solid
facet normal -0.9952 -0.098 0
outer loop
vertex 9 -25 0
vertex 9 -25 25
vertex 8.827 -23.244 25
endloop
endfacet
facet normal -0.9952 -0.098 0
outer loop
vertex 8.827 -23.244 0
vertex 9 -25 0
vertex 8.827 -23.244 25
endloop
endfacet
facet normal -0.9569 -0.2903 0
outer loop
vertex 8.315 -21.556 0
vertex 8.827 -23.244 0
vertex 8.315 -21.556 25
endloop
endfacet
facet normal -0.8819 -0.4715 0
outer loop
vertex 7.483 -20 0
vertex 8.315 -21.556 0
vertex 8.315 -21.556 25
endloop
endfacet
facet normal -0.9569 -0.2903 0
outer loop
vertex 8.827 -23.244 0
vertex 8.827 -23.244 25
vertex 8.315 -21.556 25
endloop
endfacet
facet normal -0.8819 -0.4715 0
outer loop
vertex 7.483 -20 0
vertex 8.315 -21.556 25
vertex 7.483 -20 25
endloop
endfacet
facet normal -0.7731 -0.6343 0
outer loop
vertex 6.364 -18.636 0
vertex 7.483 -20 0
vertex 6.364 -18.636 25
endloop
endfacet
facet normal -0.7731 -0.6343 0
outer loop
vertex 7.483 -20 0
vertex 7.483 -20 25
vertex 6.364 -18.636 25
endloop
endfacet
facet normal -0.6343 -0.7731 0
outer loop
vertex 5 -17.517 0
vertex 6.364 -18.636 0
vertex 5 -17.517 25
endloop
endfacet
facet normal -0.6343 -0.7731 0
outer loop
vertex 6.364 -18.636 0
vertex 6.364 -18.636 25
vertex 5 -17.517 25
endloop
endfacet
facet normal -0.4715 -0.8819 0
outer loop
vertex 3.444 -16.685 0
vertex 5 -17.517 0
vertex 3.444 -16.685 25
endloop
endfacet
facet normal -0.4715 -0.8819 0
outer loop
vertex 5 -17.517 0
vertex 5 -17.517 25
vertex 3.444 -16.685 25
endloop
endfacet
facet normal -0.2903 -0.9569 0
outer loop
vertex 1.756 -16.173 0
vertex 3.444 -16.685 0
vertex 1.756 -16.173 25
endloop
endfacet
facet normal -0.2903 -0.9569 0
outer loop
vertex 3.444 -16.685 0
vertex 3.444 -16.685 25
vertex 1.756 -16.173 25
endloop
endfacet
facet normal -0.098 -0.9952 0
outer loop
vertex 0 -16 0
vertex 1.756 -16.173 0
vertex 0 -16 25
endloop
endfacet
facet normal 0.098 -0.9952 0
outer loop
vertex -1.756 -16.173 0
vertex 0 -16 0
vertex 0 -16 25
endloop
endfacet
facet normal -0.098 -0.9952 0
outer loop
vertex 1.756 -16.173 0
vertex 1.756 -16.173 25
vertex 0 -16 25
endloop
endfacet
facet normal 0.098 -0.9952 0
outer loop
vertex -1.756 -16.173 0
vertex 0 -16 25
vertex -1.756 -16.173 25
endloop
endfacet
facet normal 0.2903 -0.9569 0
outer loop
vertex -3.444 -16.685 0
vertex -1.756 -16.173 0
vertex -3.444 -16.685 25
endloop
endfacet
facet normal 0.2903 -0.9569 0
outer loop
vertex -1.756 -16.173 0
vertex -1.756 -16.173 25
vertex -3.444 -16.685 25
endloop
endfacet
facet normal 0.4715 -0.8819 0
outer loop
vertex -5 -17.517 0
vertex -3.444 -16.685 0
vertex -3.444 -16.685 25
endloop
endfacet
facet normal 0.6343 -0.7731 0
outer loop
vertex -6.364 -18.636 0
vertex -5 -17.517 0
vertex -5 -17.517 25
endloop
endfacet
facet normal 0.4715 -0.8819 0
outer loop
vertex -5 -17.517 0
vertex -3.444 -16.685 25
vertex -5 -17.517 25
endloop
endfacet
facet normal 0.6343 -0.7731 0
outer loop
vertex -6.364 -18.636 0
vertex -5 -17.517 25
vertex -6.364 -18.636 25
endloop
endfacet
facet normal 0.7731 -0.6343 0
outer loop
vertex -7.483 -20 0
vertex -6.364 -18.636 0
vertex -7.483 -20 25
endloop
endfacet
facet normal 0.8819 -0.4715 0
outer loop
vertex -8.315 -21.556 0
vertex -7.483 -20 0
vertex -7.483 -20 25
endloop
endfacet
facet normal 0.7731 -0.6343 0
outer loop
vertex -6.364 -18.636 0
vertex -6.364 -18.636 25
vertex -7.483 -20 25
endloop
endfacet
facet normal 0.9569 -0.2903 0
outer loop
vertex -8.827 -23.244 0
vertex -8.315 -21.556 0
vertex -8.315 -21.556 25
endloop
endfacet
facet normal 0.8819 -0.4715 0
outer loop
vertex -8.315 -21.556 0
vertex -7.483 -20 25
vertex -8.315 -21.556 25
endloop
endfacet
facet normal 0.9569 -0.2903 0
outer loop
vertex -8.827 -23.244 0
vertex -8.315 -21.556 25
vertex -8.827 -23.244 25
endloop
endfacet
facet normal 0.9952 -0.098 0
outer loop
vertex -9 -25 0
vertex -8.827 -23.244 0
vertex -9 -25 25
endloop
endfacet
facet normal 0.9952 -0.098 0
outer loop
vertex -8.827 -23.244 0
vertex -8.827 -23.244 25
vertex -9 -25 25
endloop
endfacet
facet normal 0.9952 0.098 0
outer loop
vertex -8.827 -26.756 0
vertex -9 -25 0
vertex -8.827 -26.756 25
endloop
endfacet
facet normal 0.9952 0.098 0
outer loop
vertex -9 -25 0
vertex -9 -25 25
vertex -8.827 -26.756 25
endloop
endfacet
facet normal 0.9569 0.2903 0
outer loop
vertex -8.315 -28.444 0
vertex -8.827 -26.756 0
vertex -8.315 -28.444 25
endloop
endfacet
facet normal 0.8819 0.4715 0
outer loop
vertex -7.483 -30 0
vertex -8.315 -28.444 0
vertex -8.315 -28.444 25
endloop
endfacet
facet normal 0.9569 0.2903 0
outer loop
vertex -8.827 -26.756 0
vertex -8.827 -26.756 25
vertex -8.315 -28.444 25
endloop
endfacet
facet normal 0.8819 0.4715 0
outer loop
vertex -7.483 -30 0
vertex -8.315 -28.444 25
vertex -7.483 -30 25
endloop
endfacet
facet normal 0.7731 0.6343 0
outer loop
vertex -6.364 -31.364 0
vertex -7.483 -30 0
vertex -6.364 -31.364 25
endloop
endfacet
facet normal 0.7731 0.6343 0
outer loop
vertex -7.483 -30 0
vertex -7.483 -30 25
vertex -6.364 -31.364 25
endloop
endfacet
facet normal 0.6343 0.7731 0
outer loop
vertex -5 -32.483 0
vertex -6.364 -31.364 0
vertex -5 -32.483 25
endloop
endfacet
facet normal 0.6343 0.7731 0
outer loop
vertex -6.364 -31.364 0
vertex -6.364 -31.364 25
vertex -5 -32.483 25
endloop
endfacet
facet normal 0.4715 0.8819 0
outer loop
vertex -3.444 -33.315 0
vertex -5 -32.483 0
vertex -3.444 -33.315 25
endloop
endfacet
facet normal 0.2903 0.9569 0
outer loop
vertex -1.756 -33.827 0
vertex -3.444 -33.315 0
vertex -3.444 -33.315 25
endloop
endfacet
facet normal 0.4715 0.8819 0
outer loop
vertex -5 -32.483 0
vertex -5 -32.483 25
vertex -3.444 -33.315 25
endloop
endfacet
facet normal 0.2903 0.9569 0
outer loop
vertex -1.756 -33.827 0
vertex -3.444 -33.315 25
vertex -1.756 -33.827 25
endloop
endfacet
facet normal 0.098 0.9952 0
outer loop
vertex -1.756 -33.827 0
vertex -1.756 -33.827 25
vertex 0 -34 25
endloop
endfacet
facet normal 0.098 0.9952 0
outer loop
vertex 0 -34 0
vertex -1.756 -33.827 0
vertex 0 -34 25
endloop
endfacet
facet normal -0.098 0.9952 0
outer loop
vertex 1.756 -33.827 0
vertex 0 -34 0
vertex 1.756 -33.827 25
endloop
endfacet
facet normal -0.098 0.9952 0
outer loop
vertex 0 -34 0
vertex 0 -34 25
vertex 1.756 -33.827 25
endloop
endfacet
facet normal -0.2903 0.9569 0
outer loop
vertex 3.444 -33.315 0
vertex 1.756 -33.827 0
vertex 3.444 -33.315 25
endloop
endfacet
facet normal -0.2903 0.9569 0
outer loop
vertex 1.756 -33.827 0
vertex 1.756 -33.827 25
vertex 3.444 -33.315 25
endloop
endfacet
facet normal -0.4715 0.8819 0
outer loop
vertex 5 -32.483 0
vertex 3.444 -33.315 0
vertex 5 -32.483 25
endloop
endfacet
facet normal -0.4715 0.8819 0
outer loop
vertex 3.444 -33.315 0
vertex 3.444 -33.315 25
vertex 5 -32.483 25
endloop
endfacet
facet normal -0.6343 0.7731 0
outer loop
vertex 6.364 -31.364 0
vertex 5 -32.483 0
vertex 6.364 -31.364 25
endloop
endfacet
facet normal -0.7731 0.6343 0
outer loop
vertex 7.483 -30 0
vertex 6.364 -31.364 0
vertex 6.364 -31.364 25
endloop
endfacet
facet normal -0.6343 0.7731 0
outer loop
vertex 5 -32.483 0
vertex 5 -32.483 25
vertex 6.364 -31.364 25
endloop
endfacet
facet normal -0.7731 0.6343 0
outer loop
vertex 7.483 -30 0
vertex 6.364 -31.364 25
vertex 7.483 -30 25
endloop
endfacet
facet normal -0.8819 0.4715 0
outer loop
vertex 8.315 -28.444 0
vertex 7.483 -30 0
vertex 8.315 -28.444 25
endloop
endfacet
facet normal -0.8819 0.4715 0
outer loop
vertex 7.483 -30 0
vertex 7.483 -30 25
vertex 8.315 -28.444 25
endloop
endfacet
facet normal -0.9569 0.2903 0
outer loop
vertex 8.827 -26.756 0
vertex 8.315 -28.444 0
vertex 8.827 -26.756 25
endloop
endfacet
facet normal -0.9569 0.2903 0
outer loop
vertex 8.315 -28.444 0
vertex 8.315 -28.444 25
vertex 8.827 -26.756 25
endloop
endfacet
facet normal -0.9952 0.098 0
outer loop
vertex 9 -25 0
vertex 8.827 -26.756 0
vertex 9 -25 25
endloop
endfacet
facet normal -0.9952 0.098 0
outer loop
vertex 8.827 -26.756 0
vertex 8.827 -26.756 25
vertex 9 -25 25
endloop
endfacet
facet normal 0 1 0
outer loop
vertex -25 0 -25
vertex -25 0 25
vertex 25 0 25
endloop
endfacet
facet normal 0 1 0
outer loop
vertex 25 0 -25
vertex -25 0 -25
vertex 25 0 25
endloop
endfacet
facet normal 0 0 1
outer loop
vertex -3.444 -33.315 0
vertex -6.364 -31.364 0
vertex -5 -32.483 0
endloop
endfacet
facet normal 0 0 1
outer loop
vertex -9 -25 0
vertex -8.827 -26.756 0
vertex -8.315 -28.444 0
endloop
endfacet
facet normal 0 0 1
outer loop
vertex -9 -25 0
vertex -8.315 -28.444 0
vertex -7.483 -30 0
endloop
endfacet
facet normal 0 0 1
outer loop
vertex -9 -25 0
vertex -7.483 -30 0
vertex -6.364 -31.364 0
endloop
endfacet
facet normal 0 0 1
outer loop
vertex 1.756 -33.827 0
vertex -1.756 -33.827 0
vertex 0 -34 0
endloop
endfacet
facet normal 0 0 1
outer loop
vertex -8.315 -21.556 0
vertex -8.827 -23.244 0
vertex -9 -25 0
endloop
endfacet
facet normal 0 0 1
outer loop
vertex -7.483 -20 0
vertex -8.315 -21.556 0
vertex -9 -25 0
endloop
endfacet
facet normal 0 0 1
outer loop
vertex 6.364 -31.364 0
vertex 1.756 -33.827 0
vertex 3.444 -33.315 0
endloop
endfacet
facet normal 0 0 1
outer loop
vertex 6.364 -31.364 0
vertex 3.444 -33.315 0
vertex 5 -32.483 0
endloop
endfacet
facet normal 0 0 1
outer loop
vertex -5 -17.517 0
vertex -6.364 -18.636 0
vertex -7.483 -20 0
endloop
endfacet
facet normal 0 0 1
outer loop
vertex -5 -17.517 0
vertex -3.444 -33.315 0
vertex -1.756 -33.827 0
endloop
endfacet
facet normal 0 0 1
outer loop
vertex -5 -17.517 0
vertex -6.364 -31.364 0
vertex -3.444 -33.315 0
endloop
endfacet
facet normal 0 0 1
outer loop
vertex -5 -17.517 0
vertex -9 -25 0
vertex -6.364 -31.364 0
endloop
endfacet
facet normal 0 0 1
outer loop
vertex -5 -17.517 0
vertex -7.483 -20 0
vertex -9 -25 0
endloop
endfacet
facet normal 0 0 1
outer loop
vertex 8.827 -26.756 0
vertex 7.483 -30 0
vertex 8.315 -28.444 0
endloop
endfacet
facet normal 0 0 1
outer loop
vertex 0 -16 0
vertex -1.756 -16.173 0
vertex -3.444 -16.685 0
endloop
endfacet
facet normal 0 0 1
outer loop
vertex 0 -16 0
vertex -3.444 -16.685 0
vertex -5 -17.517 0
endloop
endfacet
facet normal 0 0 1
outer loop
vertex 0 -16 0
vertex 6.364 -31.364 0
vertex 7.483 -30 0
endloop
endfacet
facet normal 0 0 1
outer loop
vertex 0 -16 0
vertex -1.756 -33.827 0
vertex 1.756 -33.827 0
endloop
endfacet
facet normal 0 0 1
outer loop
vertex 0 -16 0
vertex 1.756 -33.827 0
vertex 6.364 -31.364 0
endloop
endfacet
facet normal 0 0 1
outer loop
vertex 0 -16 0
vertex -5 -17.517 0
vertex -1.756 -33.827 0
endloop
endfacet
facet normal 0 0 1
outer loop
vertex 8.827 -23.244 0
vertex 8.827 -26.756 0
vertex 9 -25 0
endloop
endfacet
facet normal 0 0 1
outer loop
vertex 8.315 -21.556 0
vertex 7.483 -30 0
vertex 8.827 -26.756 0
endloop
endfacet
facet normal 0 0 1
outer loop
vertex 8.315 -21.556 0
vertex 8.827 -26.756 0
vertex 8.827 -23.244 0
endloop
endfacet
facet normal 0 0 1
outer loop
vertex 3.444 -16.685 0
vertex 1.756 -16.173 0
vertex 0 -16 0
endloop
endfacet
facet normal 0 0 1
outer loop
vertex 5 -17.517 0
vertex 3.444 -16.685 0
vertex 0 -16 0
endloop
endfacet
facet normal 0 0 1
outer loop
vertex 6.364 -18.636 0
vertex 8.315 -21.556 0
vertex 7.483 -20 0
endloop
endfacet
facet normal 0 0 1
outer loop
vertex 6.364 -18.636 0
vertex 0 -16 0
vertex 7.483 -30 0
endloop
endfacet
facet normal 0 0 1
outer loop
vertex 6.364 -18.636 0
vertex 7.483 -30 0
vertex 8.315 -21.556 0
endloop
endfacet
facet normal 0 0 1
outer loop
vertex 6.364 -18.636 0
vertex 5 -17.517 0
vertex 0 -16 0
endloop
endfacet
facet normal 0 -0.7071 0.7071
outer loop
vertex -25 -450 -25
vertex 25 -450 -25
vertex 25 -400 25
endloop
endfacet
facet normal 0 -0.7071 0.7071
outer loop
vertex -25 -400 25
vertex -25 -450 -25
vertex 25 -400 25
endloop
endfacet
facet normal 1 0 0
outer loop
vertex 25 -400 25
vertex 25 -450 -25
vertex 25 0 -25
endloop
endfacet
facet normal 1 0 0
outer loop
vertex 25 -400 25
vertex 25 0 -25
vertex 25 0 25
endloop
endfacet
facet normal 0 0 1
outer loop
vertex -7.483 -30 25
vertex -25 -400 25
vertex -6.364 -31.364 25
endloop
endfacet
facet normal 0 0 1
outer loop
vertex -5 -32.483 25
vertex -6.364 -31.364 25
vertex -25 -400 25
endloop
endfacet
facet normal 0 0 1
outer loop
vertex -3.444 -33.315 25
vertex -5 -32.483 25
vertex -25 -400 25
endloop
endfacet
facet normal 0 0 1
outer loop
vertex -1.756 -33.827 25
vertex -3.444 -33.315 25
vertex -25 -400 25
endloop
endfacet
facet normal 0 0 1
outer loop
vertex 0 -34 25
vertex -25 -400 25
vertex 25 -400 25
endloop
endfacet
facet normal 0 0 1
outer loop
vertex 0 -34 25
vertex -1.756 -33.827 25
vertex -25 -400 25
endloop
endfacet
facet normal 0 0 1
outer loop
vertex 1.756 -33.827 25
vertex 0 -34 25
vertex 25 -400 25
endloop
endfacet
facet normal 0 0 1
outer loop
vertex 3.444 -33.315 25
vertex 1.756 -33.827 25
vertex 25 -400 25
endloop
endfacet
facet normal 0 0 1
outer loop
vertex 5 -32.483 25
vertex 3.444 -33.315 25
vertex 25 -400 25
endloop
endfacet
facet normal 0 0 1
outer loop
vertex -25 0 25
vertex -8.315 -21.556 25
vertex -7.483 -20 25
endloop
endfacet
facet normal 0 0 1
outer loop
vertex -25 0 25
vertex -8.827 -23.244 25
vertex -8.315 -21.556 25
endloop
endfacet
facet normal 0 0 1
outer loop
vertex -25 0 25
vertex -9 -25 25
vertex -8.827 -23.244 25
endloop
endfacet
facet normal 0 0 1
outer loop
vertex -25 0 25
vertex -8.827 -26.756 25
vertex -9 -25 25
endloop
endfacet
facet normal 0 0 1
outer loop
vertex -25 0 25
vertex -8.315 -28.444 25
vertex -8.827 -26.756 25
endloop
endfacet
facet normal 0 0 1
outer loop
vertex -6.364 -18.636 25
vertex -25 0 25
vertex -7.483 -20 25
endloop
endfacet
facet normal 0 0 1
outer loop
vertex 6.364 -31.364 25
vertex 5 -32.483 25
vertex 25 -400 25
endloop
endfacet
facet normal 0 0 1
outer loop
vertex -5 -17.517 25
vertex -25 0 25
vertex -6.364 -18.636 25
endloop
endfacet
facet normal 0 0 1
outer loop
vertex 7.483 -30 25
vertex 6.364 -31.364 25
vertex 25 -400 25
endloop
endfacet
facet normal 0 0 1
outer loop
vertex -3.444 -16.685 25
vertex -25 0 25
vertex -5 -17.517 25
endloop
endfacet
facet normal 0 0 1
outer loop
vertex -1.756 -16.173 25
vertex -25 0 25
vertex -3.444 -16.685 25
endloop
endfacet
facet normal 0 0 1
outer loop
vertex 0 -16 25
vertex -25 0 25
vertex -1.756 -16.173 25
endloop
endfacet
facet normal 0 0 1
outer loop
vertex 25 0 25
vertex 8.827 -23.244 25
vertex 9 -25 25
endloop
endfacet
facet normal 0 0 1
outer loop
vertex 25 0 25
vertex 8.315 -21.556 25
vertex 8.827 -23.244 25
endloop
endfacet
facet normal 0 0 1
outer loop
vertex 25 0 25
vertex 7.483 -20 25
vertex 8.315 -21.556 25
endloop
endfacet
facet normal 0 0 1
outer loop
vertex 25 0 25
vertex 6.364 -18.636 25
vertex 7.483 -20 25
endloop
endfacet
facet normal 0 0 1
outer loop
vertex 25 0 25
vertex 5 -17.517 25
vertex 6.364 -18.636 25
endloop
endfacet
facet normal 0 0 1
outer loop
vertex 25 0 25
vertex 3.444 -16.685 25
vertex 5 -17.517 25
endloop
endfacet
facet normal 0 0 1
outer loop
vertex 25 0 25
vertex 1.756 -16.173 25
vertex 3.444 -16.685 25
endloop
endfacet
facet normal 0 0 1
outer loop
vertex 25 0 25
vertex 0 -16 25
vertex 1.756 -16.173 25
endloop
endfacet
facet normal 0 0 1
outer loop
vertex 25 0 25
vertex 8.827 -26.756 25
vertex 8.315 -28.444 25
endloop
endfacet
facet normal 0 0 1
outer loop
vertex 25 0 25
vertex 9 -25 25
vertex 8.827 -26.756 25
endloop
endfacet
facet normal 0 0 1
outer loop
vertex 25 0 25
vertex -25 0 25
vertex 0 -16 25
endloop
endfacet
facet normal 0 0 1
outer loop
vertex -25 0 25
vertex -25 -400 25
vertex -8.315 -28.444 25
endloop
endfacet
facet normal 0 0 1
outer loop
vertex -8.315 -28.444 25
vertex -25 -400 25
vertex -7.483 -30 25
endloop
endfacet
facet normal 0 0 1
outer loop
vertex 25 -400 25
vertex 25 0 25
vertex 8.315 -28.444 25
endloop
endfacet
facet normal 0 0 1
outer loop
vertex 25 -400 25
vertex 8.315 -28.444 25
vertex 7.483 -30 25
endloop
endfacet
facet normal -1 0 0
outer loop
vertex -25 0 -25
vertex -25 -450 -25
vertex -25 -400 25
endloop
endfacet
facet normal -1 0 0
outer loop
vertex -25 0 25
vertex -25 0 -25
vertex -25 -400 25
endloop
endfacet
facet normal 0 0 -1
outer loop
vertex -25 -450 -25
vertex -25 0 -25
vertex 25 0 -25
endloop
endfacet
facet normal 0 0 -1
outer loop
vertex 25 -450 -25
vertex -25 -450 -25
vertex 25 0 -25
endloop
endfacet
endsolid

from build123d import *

# Parameters (mm, degrees)
F0_W     = 50
F0_H     = 50
F1_DEPTH = 450
F3_DEPTH = 50.001
F4_R     = 9
F5_DEPTH = 25


with BuildPart() as f1:
    # F0 (on Front) → F1 (new body)
    with BuildSketch(Plane.XZ):
        Rectangle(F0_W, F0_H)
    extrude(amount=F1_DEPTH)

    # F2 (on face) → F3 (cut, through all)
    with BuildSketch(Plane.YZ.offset(25)):
        Polygon((-400, 25), (-450, 25), (-450, -25), align=None)
    extrude(amount=-F3_DEPTH, mode=Mode.SUBTRACT)

    # F4 (on face) → F5 (cut)
    with BuildSketch(Plane.XY.offset(25)):
        with Locations((0, -25)):
            Circle(F4_R)
    extrude(amount=-F5_DEPTH, mode=Mode.SUBTRACT)


solid = f1.part
